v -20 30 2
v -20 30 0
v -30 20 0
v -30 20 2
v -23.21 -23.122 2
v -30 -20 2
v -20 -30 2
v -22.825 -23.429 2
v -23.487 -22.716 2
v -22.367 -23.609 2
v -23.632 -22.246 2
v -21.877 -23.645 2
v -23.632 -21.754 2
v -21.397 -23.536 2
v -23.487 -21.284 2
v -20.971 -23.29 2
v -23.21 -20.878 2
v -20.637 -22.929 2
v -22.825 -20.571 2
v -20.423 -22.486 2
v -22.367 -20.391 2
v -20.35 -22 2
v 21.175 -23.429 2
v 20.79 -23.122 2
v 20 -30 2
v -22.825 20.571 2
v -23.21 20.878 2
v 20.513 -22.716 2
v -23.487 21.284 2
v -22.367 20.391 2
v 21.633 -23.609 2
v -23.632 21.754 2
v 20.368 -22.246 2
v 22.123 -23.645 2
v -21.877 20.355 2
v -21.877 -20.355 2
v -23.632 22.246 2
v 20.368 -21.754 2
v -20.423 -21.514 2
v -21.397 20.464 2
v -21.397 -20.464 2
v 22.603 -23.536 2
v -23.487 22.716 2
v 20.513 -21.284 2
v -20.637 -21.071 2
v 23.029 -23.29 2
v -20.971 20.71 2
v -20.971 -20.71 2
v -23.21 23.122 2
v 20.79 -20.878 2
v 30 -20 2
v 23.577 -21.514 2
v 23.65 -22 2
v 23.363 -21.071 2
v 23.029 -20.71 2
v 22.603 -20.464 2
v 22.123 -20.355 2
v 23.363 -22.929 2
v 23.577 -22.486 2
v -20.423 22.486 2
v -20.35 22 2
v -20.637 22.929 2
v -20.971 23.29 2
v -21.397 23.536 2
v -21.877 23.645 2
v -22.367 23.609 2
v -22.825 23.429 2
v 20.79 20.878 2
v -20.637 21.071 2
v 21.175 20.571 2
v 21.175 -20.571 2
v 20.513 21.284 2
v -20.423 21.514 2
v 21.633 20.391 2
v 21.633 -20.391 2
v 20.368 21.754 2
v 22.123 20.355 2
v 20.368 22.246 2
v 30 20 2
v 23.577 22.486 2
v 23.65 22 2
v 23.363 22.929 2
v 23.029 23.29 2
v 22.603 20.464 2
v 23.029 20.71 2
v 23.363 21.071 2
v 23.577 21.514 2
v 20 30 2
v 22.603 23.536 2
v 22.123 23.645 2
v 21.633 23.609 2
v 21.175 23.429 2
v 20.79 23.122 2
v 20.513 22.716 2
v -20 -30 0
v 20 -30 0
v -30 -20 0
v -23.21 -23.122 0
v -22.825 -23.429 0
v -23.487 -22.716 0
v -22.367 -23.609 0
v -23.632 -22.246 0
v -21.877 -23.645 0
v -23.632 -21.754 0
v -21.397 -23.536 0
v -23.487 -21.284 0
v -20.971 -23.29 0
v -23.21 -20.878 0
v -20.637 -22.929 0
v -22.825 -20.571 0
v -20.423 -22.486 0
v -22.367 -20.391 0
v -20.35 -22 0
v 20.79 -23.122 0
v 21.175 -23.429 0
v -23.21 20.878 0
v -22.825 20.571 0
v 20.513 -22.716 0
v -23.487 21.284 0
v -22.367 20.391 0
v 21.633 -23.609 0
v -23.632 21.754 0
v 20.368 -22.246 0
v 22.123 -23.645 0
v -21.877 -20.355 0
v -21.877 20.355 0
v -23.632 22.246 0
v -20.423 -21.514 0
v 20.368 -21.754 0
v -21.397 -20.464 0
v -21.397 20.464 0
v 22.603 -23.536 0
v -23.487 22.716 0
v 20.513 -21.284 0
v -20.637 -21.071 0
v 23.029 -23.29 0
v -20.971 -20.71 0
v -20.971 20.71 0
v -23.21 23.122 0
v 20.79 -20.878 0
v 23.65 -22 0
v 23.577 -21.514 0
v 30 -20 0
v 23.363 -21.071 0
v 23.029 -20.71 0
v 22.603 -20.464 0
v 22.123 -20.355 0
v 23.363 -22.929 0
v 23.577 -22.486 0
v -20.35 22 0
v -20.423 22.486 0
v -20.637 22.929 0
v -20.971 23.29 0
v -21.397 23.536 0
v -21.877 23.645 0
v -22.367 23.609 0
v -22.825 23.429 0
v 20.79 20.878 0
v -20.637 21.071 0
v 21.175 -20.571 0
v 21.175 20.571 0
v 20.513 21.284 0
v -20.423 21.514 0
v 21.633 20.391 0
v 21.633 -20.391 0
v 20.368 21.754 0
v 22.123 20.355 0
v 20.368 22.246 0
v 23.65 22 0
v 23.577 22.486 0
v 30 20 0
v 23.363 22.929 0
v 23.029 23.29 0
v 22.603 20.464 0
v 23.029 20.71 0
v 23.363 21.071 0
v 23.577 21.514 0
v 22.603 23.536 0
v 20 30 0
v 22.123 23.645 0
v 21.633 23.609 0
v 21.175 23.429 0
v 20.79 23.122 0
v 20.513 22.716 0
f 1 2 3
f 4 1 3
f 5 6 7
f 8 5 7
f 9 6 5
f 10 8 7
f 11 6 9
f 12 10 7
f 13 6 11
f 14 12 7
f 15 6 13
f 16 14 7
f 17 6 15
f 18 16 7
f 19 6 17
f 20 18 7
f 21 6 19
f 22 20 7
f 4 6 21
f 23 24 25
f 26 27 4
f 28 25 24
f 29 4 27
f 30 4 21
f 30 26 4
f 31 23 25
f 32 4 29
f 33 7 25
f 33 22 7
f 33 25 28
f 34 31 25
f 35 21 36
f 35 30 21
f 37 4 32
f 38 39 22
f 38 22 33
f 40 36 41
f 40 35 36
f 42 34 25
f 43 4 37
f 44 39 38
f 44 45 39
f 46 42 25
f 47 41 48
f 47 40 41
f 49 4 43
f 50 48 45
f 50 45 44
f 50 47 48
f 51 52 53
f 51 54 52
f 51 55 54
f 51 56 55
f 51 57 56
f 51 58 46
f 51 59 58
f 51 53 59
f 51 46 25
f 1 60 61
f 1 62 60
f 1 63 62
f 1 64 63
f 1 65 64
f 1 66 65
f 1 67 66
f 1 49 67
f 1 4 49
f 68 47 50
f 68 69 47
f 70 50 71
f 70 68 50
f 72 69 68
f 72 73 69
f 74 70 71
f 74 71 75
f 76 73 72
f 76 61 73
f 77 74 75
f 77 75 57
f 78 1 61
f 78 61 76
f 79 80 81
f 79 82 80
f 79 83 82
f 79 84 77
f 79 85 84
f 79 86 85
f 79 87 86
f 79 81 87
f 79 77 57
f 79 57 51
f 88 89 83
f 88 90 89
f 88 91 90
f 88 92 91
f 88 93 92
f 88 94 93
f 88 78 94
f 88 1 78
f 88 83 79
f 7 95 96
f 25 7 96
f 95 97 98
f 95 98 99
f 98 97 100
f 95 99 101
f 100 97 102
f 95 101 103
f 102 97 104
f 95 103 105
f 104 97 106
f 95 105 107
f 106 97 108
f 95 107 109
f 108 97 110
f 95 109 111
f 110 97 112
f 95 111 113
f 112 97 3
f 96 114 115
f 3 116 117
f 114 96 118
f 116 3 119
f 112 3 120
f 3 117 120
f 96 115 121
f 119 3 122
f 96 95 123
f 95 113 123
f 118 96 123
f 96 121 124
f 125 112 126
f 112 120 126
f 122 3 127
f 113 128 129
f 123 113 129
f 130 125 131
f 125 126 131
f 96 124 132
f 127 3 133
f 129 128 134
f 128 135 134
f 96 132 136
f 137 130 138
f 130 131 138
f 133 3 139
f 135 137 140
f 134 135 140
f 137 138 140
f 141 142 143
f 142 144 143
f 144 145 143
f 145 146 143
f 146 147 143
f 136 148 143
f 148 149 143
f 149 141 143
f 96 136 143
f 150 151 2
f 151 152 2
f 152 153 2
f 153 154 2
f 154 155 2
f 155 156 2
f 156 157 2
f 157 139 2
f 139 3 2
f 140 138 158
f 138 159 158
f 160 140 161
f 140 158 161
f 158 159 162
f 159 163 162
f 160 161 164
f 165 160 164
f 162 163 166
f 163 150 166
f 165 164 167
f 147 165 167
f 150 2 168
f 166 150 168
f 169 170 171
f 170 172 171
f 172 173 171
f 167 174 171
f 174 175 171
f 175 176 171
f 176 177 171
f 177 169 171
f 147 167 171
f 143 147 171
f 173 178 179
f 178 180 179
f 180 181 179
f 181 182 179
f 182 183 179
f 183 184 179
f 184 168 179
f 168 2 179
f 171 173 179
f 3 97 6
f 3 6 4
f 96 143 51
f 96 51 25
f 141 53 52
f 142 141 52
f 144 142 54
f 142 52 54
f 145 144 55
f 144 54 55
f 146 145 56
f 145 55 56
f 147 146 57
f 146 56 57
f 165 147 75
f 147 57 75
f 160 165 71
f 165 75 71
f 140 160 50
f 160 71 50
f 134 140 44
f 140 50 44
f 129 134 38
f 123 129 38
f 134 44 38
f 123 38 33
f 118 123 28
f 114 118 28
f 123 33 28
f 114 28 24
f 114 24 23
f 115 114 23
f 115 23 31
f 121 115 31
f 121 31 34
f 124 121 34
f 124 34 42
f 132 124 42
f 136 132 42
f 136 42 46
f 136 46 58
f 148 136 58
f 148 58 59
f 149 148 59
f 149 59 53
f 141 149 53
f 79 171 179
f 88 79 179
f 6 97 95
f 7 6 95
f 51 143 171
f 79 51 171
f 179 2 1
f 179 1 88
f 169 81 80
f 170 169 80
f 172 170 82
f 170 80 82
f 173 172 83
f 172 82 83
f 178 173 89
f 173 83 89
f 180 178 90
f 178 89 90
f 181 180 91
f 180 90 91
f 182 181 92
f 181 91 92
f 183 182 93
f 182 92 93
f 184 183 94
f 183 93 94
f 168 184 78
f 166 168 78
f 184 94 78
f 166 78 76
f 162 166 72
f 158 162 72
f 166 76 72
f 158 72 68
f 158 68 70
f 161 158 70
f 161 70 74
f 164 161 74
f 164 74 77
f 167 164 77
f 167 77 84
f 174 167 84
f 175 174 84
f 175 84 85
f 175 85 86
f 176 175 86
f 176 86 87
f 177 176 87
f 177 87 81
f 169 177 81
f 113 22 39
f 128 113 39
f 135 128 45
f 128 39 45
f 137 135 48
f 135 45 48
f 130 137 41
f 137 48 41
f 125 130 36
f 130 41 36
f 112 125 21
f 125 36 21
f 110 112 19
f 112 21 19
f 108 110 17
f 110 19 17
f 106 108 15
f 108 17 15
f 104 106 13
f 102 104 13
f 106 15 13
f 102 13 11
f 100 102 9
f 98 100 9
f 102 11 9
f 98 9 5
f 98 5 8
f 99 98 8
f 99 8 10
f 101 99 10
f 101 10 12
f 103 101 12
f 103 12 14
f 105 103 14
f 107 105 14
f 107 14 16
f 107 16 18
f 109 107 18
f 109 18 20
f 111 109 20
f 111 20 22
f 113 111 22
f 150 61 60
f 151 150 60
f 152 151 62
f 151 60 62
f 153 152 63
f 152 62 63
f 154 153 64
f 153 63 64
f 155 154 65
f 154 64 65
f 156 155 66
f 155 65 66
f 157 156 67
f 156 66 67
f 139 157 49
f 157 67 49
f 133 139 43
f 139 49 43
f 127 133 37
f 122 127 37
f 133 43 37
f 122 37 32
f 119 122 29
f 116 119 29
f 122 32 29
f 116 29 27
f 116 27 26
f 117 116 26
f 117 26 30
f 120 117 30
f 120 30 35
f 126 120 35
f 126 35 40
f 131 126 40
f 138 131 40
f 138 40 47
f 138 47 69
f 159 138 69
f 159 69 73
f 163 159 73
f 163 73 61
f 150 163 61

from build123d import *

# Parameters (mm, degrees)
SKETCH_1_W          = 60
SKETCH_1_H          = 60
EXTRUDE_1_DEPTH     = 2
M4X0_7_1_D          = 3.3
M4X0_7_1_DEPTH      = 11.5
M4X0_7_1_TIP        = 0.991420021
CUT_EXTRUDE_1_DEPTH = 80


with BuildPart() as part:
    # ｽｹｯﾁ1 → ﾎﾞｽ - 押し出し1 (new body)
    with BuildSketch(Plane.XY):
        Rectangle(SKETCH_1_W, SKETCH_1_H)
    extrude(amount=EXTRUDE_1_DEPTH)

    # M4x0.7 ねじ穴1
    with Locations(Plane(origin=(22, 22, 0), x_dir=(-1, 0, 0), z_dir=(0, 0, -1))):
        with Locations((0, 0), (0, -44), (44, -44), (44, 0)):
            Hole(M4X0_7_1_D / 2, depth=M4X0_7_1_DEPTH)
            with Locations((0, 0, -(M4X0_7_1_DEPTH + M4X0_7_1_TIP / 2))):  # 118° drill point
                Cone(0, M4X0_7_1_D / 2, M4X0_7_1_TIP, mode=Mode.SUBTRACT)

    # ｽｹｯﾁ4 → ｶｯﾄ - 押し出し1 (cut)
    with BuildSketch(Plane(origin=(0, 0, 0), x_dir=(-1, 0, 0), z_dir=(0, 0, -1))):
        Polygon((-30, -30), (-30, -20), (-20, -30), align=None)
        Polygon((-24.998553068, 25.001446932), (-30, 20), (-30, 30), (-20, 30), align=None)
        Polygon((30, 30), (20, 30), (30, 20), align=None)
        Polygon((30, -30), (30, -20), (20, -30), align=None)
    extrude(amount=-CUT_EXTRUDE_1_DEPTH, mode=Mode.SUBTRACT)


solid = part.part
